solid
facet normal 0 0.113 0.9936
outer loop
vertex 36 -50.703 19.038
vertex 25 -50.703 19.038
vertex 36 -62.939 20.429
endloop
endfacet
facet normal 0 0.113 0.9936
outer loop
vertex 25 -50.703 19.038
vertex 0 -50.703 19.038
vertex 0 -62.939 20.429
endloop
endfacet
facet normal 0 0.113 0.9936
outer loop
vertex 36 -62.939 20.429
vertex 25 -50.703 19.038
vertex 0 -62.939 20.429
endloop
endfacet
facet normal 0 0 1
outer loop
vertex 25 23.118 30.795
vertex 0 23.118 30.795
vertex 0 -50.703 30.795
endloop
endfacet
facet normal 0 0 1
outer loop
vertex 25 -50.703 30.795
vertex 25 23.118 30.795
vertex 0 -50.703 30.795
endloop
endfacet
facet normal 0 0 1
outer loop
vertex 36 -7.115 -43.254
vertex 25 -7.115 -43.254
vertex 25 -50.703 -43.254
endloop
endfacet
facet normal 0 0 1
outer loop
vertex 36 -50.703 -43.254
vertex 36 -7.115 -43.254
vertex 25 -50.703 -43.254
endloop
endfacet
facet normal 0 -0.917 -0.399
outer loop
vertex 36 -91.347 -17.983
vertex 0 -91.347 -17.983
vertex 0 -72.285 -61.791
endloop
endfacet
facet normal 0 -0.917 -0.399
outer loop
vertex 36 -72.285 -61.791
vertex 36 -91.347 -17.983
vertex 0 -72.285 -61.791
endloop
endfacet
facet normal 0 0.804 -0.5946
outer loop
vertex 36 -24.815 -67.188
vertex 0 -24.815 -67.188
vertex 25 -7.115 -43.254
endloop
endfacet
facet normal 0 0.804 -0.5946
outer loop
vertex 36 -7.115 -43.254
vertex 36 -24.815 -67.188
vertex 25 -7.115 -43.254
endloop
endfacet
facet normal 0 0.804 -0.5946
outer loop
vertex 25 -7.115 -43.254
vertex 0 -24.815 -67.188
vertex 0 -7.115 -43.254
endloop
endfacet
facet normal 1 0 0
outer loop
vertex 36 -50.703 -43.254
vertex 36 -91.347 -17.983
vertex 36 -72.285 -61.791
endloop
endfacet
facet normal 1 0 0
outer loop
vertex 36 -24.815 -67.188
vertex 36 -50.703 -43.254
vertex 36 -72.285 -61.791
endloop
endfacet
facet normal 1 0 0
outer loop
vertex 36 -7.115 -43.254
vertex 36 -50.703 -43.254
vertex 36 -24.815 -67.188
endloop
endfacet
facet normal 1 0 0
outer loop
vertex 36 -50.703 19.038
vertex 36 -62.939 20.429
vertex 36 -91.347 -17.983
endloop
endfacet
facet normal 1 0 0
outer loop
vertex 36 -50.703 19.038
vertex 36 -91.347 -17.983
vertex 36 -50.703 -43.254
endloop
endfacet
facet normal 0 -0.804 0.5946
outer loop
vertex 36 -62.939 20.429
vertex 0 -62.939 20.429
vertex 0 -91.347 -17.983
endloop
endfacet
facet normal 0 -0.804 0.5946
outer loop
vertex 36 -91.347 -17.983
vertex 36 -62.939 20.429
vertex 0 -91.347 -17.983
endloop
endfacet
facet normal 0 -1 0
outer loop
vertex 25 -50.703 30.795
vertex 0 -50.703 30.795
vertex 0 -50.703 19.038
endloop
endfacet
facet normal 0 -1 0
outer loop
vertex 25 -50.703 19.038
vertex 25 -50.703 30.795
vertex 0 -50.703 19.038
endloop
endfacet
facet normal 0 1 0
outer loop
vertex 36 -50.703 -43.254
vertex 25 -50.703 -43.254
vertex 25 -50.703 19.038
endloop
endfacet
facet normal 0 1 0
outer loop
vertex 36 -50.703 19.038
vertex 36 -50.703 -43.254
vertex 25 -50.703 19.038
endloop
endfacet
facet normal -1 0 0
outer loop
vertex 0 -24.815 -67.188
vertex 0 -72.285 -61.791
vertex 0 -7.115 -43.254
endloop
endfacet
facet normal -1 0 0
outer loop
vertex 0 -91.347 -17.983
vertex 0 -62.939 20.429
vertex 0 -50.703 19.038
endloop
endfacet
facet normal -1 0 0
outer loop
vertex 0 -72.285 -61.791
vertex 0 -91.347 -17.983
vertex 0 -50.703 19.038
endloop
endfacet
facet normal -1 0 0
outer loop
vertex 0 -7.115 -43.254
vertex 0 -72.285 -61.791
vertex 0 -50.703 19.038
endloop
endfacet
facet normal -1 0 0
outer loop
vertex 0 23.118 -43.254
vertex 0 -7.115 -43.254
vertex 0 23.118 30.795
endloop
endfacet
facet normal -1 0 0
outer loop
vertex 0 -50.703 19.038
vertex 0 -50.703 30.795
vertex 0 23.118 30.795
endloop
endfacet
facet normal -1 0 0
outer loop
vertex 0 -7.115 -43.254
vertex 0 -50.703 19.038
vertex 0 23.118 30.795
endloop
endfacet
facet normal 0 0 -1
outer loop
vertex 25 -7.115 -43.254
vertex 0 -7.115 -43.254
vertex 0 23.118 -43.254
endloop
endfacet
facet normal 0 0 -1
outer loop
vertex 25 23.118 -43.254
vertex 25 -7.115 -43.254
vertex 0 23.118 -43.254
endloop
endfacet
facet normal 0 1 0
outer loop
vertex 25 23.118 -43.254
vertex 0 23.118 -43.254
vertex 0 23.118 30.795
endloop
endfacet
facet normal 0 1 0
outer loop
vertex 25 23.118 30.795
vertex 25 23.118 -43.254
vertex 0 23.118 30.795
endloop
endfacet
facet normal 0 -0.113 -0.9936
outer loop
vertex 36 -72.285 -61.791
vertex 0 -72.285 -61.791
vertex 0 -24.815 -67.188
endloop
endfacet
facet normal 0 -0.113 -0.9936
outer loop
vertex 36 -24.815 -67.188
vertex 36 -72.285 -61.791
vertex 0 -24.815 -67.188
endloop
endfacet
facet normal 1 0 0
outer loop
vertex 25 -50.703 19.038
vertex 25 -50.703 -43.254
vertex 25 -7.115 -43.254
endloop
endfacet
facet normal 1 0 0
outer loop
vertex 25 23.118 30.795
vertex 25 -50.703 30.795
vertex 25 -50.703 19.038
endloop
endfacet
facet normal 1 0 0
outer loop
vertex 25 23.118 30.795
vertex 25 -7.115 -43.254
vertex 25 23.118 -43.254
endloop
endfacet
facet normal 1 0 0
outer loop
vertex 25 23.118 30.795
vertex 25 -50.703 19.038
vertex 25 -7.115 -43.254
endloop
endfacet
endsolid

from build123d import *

# Parameters (mm, degrees)
F4_DEPTH = 25
F6_DEPTH = 36


with BuildPart() as f4:
    # F2 (on Right) → F4 (new body)
    with BuildSketch(Plane.YZ):
        Polygon((23.118287, 0), (23.118287, 30.795261), (-50.702602, 30.795261), (-50.702602, 19.038247), (-50.702602, -43.253601), (-7.1146, -43.253601), (23.118287, -43.253601), align=None)
    extrude(amount=F4_DEPTH)

    # F1 (on face) → F6 (join)
    with BuildSketch(Plane.YZ):
        Polygon((-62.939021, 20.429226), (-91.347322, -17.983027), (-72.285485, -61.791464), (-24.815348, -67.187647), (-7.1146, -43.253601), (-50.702602, -43.253601), (-50.702602, 19.038247), align=None)
    extrude(amount=F6_DEPTH)


solid = f4.part
